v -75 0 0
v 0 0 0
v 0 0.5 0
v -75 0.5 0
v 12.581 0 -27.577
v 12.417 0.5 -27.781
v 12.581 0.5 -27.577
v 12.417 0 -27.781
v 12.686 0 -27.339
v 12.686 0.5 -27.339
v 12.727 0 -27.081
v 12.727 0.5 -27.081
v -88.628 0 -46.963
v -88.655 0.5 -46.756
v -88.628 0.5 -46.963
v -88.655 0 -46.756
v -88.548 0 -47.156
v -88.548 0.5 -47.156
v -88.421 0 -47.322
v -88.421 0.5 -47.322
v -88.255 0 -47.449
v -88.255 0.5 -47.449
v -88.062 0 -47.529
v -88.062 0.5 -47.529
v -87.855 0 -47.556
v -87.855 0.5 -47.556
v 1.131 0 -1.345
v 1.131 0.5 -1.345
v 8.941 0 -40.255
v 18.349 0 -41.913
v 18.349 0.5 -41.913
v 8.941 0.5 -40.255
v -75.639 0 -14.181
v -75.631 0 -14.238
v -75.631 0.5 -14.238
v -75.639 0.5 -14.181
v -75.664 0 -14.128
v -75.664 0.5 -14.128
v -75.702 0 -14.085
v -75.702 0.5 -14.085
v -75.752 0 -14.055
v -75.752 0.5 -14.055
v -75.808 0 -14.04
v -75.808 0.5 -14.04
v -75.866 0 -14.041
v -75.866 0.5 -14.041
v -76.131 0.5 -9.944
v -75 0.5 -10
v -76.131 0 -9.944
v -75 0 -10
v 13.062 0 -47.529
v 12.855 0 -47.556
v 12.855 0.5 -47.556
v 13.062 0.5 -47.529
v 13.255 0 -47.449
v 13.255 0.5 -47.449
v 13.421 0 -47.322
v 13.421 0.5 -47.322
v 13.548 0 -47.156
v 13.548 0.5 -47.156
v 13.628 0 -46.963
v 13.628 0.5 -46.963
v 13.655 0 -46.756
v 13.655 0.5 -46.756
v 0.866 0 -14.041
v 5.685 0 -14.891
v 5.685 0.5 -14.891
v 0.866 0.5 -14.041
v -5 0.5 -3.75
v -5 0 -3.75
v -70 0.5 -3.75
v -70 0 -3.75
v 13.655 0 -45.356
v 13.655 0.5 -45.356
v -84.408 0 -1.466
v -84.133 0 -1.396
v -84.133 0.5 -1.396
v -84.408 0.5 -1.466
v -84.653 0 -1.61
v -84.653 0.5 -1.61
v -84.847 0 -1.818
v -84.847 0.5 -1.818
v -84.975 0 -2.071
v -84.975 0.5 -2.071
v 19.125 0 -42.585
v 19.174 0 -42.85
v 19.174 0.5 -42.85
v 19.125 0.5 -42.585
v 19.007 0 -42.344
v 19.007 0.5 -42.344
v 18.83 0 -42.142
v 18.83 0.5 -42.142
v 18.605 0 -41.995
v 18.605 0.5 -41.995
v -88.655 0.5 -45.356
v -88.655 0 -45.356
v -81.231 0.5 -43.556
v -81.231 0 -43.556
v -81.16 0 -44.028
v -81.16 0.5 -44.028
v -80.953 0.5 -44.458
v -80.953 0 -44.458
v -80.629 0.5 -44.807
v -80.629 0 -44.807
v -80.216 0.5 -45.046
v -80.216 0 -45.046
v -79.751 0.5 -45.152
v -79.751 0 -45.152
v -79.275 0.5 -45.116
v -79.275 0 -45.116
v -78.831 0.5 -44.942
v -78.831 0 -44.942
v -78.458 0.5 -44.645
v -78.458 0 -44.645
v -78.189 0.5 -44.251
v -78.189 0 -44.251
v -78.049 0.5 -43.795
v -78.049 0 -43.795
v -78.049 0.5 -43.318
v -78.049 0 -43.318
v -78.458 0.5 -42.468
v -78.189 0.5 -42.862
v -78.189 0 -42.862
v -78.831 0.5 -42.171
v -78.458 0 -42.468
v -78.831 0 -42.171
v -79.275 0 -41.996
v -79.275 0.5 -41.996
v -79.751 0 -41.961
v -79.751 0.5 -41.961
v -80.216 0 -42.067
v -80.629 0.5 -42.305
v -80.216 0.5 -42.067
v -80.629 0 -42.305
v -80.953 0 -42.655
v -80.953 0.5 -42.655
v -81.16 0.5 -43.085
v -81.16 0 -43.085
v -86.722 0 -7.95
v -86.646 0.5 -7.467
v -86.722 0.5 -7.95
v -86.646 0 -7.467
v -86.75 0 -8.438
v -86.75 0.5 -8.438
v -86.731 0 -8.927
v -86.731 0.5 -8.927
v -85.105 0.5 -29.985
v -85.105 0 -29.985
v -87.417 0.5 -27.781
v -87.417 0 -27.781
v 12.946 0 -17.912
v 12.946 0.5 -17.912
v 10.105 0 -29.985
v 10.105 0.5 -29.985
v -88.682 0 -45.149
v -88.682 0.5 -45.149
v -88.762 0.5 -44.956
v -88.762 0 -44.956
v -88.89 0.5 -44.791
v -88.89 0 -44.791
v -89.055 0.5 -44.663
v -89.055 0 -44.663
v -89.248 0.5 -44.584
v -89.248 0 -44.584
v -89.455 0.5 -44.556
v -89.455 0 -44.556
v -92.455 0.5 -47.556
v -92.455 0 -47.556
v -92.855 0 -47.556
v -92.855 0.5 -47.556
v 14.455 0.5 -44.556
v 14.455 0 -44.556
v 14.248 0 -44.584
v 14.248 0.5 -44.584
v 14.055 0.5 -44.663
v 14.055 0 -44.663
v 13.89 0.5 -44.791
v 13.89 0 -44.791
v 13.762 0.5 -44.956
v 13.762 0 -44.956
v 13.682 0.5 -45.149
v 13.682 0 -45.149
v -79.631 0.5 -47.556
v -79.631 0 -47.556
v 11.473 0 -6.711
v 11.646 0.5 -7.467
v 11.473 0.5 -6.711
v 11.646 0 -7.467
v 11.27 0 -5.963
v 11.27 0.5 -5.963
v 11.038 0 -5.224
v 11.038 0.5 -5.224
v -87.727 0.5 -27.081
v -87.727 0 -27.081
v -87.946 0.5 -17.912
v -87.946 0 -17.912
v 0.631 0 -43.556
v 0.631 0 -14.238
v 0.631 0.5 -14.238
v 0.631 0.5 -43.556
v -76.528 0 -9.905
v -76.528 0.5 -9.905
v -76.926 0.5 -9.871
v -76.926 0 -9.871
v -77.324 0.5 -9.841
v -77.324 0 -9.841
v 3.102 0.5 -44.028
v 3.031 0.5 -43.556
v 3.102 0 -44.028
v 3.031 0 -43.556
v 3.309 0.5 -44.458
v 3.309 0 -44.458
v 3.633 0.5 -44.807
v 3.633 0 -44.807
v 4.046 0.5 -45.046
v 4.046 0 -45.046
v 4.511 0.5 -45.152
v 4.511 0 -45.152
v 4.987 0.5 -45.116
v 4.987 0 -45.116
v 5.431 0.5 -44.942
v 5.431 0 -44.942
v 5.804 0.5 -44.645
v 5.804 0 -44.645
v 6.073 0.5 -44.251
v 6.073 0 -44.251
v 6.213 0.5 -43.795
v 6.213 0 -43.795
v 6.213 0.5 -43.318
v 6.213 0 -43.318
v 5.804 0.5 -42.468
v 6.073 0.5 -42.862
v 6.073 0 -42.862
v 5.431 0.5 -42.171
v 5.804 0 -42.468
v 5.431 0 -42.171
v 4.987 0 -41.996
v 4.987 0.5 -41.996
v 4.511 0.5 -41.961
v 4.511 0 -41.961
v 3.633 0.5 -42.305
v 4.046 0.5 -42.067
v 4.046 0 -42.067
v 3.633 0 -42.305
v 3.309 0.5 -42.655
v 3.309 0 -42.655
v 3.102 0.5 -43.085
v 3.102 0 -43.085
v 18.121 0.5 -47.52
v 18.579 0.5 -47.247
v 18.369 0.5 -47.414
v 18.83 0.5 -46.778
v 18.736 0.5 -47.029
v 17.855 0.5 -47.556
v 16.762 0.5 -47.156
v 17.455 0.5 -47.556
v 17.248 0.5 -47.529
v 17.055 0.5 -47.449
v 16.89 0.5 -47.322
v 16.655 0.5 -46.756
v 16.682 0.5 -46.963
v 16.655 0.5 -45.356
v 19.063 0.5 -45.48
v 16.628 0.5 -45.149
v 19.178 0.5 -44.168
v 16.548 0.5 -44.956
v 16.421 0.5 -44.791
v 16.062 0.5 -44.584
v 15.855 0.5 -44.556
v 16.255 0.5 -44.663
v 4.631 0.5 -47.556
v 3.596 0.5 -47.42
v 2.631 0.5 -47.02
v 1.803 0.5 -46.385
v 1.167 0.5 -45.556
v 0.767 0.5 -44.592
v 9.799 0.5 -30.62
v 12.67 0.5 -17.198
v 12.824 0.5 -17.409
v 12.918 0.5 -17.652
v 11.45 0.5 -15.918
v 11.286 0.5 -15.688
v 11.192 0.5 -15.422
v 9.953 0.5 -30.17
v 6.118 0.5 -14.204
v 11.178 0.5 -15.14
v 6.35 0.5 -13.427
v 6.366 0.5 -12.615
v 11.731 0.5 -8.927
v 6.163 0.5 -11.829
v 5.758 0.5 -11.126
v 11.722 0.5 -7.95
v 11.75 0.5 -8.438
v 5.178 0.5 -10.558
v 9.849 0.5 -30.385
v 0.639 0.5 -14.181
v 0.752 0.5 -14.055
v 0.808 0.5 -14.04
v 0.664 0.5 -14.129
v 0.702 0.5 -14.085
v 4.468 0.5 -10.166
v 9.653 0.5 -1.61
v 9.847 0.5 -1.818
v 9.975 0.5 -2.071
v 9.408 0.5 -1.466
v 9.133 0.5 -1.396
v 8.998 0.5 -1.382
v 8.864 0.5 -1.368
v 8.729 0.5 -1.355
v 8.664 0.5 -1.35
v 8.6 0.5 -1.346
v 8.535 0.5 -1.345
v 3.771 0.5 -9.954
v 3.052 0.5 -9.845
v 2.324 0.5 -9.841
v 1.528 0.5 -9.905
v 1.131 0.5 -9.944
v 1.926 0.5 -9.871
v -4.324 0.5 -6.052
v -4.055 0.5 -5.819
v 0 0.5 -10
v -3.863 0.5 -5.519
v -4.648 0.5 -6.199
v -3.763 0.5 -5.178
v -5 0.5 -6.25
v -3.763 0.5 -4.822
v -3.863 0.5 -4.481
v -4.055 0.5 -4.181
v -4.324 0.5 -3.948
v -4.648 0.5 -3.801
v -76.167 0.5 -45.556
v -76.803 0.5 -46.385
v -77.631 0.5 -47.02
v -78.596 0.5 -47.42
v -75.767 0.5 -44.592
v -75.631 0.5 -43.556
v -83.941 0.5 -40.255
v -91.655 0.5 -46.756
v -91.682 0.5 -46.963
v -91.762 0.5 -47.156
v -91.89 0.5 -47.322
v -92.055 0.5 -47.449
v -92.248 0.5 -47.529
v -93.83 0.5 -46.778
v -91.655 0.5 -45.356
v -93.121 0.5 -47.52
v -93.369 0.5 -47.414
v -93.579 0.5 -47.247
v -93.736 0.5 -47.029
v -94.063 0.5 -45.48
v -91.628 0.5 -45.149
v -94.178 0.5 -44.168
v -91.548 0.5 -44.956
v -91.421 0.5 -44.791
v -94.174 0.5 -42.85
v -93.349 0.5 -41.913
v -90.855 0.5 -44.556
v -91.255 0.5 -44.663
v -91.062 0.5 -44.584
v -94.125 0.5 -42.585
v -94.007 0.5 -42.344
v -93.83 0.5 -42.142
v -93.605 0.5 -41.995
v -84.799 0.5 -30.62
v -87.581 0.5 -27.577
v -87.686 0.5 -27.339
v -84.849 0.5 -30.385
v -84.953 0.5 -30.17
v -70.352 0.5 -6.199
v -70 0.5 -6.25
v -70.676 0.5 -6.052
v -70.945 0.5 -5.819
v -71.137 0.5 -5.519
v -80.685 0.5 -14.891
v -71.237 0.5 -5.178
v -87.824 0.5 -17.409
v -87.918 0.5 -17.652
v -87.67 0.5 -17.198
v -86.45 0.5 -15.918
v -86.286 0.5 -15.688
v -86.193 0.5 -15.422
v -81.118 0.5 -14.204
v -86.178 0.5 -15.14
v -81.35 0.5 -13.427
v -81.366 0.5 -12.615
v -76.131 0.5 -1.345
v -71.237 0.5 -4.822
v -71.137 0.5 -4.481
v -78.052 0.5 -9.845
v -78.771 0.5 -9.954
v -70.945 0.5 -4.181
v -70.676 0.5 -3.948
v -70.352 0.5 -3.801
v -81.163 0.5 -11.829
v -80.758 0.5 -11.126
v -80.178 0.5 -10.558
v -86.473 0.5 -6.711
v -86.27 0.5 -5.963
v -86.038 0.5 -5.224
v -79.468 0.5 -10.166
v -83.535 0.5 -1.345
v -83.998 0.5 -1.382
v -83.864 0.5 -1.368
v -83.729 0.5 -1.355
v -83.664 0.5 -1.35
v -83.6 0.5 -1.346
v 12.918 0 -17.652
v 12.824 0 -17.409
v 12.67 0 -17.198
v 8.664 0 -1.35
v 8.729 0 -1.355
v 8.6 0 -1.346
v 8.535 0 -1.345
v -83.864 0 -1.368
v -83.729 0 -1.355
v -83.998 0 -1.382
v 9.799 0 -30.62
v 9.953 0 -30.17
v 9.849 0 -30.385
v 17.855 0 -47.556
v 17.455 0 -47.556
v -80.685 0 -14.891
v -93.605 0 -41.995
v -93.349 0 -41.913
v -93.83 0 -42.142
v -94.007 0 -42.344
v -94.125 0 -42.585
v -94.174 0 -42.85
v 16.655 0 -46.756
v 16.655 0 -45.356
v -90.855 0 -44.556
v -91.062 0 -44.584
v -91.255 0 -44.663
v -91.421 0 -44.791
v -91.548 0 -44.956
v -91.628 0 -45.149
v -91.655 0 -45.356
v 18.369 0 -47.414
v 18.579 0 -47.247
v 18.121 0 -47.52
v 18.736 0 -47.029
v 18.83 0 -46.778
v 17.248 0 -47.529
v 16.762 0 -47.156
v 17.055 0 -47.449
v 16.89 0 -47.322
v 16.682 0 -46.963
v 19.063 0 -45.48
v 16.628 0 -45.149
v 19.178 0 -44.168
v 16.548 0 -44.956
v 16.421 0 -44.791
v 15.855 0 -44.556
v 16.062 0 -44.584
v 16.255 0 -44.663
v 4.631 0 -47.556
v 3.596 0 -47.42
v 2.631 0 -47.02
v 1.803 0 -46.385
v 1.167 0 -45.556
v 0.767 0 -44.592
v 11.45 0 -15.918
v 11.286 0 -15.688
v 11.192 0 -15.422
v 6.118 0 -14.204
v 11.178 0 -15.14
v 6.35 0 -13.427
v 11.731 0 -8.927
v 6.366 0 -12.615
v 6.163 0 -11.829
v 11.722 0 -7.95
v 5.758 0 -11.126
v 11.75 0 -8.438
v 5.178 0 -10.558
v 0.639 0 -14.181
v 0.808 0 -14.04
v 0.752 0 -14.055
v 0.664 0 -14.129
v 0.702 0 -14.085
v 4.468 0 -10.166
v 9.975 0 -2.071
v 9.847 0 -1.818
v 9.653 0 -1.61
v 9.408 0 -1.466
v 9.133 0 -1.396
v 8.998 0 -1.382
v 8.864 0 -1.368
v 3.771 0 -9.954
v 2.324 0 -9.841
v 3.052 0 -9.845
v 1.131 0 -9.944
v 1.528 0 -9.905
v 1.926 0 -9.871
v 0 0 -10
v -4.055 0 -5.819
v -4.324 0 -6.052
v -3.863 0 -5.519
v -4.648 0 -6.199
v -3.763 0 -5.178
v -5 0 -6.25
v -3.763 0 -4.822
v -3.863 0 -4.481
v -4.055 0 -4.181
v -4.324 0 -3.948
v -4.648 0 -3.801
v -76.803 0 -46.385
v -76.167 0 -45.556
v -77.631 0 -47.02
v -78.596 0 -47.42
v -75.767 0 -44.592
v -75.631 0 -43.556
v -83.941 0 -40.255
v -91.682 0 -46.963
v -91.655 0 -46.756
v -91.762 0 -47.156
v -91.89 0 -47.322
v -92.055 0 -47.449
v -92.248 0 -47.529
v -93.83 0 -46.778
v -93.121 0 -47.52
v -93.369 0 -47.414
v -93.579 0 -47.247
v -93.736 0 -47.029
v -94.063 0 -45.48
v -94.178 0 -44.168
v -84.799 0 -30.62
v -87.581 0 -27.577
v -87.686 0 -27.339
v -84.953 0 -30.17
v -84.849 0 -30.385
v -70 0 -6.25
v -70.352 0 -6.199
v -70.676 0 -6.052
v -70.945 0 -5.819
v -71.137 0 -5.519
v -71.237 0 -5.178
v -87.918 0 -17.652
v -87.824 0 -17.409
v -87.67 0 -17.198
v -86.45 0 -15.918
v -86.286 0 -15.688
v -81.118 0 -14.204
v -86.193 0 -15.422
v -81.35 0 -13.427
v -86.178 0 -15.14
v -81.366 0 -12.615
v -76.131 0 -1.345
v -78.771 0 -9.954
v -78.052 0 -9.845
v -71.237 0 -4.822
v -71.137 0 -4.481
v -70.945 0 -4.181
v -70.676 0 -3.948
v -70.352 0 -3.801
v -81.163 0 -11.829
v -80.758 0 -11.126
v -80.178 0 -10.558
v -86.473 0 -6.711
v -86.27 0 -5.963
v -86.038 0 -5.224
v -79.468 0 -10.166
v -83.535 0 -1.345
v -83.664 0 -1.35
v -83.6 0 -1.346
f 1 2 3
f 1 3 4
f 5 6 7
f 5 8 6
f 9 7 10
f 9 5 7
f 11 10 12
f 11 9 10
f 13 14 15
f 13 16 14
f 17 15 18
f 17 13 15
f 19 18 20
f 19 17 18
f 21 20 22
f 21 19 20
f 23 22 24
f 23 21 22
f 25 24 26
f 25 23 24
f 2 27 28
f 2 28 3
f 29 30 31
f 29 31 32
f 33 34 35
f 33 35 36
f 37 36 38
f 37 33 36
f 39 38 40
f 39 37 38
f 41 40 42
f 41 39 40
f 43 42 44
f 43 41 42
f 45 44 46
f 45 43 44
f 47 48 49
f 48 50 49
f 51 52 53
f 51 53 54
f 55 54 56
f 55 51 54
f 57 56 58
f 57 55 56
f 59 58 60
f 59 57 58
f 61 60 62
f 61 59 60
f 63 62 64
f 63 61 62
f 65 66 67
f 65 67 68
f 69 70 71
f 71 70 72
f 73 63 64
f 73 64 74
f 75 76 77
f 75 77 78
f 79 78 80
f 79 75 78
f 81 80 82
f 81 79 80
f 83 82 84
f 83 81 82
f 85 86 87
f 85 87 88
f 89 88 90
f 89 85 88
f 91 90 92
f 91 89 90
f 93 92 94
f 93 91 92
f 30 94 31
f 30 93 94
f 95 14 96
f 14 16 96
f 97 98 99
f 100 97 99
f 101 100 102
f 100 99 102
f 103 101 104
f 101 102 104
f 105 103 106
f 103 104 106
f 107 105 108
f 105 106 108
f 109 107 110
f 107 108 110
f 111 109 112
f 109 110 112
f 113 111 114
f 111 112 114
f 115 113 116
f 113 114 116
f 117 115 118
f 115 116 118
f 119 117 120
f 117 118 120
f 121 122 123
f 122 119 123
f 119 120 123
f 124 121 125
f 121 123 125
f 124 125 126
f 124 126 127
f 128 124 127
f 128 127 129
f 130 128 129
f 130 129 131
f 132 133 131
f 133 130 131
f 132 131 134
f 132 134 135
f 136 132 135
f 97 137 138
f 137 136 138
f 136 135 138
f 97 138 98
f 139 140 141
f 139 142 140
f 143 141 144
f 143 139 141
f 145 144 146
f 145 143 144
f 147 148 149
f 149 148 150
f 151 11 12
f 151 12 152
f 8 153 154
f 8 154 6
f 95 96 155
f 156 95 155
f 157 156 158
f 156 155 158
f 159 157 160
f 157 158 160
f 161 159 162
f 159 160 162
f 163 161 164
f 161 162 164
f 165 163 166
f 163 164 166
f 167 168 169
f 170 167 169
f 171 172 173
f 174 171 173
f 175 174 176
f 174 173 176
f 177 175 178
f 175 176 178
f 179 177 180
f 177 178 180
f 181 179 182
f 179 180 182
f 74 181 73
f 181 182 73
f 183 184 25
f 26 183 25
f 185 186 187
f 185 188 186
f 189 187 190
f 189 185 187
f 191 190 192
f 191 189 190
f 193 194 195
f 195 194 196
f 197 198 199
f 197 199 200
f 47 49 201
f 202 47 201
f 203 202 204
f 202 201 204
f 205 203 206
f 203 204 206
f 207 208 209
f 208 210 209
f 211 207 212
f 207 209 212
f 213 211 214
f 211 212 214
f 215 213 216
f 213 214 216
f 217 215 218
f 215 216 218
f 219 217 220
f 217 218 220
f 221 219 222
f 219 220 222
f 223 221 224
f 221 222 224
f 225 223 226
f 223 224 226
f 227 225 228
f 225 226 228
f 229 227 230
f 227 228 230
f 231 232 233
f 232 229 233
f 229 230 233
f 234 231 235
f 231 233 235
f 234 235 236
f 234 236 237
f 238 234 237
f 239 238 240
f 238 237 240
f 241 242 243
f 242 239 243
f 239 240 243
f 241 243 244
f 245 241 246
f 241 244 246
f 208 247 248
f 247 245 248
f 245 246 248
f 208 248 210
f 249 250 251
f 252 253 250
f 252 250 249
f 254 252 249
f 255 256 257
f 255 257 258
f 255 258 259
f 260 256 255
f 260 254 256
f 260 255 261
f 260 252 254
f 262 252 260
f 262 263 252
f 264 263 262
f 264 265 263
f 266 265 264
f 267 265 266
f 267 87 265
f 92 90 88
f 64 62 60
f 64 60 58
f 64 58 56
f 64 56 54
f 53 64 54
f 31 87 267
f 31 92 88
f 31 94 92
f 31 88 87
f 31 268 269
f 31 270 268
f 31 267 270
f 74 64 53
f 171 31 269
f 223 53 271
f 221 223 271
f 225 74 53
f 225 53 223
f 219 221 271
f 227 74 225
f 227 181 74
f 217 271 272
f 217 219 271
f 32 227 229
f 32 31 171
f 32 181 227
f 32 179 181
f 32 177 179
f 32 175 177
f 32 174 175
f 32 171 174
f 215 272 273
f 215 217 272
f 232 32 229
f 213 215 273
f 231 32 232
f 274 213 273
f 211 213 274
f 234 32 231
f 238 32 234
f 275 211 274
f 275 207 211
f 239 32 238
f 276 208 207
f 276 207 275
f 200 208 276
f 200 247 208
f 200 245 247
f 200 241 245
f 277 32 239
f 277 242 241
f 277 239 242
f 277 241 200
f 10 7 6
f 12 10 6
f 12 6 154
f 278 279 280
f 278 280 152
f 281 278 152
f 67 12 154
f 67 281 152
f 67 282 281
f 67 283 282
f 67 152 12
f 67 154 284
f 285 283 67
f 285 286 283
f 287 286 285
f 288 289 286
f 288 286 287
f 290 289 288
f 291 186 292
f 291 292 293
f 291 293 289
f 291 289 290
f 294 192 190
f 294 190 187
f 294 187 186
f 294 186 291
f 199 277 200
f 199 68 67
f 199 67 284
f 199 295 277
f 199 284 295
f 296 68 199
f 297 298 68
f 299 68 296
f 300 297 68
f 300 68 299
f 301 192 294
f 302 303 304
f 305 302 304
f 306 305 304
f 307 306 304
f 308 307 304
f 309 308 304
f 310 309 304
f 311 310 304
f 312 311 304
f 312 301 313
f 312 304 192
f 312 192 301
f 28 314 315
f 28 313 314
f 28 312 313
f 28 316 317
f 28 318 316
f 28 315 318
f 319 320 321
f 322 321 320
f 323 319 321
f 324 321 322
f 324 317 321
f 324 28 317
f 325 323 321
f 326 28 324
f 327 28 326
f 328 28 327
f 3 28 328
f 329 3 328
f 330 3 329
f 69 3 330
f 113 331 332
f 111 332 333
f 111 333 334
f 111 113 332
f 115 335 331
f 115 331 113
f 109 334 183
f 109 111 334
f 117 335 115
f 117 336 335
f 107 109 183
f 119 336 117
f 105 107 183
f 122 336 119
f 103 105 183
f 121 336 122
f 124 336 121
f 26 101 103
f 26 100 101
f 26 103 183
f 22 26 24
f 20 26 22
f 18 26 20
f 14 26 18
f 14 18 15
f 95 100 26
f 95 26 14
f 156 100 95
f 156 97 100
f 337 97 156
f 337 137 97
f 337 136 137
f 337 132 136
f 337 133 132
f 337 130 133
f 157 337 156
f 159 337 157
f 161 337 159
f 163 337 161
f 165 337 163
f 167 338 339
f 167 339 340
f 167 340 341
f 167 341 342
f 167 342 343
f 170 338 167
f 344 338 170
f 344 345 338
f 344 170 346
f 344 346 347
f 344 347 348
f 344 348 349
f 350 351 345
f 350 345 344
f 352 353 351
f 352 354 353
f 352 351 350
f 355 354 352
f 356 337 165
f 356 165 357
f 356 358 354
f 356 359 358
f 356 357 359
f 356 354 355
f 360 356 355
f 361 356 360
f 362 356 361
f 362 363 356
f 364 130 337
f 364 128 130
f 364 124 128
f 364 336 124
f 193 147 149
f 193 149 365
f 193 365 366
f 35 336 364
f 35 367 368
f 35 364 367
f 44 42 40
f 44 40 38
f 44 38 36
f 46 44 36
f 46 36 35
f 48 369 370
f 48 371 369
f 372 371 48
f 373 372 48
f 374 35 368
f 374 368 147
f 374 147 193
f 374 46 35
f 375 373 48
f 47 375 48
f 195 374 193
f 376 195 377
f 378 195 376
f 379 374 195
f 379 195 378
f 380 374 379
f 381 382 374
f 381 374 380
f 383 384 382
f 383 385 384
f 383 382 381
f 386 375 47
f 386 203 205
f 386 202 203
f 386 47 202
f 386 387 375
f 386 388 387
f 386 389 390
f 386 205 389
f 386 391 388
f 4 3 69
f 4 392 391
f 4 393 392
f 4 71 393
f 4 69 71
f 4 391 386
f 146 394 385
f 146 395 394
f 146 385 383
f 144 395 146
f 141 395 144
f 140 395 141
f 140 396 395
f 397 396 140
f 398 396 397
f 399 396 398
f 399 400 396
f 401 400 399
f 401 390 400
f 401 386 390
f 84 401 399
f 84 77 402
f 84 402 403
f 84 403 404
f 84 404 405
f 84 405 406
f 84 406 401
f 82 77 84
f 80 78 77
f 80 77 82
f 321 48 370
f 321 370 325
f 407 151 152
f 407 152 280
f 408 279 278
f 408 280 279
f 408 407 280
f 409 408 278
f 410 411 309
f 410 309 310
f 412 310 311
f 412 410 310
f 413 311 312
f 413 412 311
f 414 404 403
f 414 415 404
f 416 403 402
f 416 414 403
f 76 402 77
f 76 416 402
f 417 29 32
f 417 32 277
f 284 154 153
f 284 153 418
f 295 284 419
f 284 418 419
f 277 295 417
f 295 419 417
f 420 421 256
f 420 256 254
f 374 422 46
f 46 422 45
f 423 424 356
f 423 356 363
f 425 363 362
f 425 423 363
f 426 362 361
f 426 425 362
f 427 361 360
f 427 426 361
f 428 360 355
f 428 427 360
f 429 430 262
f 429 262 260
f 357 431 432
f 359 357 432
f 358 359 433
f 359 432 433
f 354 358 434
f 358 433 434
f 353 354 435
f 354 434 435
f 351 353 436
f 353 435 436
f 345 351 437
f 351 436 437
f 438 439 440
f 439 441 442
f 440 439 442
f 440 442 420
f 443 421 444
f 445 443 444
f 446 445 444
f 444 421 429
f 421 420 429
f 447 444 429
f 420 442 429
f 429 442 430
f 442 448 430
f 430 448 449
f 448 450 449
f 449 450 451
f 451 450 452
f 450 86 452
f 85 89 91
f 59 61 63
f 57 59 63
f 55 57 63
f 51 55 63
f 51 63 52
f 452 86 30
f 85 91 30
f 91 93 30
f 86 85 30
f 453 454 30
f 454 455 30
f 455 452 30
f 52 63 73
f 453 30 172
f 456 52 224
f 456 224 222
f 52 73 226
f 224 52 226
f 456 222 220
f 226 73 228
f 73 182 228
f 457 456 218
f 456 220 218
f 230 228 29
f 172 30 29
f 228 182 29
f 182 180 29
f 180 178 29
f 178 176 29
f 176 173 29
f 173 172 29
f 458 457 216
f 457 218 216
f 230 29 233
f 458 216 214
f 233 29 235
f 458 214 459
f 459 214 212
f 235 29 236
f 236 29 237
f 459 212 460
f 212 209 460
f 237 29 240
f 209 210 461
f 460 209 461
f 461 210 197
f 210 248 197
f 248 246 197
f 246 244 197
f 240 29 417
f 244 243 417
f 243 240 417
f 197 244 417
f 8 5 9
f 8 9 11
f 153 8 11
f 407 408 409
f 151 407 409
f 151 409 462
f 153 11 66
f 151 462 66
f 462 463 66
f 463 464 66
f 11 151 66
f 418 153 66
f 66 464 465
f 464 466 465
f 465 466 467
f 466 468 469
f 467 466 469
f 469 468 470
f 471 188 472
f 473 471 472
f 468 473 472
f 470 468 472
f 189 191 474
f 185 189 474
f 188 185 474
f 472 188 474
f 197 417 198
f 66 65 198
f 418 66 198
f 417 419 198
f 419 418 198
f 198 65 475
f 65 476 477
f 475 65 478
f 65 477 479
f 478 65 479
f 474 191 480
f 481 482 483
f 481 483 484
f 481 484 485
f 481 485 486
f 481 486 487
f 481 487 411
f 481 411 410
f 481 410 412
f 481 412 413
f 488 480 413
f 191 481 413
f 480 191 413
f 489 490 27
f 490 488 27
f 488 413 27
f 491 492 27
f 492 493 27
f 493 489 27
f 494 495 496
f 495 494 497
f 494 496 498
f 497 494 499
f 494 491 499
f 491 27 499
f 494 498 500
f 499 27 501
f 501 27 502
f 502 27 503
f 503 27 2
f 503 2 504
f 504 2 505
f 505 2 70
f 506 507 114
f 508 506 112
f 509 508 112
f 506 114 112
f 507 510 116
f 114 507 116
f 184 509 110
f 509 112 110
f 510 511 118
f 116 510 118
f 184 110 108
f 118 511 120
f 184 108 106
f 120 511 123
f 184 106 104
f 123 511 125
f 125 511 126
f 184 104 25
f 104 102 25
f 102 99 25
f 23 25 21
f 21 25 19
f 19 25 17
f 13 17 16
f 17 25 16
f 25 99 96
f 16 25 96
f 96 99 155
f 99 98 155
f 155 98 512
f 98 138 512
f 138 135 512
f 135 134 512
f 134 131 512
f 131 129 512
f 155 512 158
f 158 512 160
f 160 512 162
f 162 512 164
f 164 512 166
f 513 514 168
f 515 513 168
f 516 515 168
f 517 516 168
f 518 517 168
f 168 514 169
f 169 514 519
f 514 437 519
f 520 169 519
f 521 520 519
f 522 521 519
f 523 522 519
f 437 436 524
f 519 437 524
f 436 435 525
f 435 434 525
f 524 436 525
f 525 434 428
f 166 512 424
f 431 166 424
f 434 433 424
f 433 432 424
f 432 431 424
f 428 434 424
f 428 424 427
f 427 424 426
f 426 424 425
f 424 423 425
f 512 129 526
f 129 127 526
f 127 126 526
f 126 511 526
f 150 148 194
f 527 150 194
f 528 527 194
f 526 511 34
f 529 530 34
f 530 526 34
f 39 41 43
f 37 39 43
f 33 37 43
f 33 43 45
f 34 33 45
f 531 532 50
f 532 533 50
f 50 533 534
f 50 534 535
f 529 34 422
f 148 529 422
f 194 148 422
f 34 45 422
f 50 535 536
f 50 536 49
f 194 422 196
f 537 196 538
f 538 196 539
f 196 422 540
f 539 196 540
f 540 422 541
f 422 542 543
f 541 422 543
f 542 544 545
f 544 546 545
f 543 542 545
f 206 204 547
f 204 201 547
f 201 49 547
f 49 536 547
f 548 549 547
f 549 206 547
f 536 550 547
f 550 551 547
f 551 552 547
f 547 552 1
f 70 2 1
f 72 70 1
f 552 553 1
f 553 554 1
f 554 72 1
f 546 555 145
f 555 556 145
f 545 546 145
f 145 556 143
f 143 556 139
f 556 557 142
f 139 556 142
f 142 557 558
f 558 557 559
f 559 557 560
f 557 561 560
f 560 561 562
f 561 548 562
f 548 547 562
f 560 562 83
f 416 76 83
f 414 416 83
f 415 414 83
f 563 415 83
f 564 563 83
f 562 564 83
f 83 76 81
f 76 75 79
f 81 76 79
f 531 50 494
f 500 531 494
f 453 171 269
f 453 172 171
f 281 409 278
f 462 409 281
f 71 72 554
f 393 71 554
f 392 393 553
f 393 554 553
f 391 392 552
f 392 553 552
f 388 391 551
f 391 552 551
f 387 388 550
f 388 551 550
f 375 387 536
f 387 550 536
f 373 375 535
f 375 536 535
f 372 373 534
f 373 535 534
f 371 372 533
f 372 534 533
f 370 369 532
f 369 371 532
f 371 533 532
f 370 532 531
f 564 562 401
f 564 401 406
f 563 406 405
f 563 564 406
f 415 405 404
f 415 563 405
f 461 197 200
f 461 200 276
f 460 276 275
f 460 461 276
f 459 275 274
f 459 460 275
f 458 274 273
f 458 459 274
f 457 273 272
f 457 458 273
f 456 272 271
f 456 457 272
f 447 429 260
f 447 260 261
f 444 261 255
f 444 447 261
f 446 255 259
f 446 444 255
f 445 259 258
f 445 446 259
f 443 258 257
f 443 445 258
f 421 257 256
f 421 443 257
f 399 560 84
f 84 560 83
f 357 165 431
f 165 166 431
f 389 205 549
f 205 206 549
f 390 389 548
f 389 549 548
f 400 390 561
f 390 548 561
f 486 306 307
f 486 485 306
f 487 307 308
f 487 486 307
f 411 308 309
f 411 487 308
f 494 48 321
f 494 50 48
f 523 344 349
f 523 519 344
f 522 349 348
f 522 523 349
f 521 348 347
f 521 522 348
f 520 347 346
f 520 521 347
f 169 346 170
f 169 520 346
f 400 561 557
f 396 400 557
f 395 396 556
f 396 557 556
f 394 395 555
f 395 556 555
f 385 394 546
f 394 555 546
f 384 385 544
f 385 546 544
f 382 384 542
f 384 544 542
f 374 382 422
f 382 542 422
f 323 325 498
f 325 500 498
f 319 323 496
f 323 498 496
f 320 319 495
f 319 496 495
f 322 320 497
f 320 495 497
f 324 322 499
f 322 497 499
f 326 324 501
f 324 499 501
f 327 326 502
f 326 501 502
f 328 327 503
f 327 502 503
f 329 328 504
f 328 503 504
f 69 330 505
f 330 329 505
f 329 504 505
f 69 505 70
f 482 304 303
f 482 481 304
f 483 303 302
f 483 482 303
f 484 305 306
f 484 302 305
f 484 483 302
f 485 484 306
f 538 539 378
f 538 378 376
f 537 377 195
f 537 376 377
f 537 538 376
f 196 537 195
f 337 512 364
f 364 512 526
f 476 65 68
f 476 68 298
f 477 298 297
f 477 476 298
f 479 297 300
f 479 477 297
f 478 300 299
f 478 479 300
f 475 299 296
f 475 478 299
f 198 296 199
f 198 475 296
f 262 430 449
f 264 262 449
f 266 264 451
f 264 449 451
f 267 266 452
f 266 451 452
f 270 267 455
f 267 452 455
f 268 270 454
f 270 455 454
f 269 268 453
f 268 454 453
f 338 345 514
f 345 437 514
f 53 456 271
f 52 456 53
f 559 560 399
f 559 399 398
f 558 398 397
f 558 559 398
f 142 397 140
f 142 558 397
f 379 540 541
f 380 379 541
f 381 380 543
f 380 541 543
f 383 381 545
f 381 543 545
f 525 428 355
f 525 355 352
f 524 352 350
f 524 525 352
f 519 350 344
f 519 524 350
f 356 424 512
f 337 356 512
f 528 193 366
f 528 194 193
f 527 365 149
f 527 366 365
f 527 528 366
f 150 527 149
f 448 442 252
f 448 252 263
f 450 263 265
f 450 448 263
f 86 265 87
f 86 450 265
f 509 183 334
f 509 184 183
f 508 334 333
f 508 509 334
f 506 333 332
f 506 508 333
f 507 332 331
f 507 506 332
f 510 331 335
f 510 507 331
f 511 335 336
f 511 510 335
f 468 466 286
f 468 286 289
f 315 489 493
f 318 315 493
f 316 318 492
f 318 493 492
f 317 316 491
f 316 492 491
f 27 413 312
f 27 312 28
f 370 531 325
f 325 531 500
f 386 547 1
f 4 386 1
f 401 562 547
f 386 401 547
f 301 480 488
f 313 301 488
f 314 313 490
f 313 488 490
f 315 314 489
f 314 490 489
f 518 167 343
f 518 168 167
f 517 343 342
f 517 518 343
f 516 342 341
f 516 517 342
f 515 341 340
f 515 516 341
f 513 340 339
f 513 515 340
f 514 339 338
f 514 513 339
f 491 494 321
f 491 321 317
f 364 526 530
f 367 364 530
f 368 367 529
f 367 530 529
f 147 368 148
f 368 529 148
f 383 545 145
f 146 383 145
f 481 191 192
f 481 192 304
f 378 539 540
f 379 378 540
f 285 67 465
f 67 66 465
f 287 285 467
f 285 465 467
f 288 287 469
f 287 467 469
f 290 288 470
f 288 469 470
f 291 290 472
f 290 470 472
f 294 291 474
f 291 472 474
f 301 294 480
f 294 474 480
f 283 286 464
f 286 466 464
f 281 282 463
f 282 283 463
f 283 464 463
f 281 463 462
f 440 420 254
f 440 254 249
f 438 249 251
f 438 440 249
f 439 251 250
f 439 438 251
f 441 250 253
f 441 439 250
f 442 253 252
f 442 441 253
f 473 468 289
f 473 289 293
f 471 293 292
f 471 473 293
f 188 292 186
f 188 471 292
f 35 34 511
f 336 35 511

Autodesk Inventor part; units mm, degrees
ref_plane "YZ Plane" through (0, 0, 0) normal (1, 0, 0) x (0, 1, 0)
ref_plane "XZ Plane" through (0, 0, 0) normal (0, 1, 0) x (-1, 0, 0)
ref_plane "XY Plane" through (0, 0, 0) normal (0, 0, 1) x (1, 0, 0)
sketch "Эскиз1" plane through (0, 0, 0) normal (0, 1, 0) x (-1, 0, 0)
  circle A0 centre (-4.631, -43.5563) radius 1.6
  arc A1 (5, -3.75) -> (5, -6.25) centre (5, -5) ccw
  line L0 (5, -3.75) -> (70, -3.75)
  arc A2 (70, -6.25) -> (70, -3.75) centre (70, -5) ccw
  line L1 (70, -6.25) -> (5, -6.25)
  arc A3 (77.3239, -9.8413) -> (76.131, -9.9442) centre (79.631, -43.5563) ccw
  arc A4 (79.4677, -10.1658) -> (77.3239, -9.8413) centre (77.6653, -14.8296) ccw
  arc A5 (80.6854, -14.8912) -> (79.4677, -10.1658) centre (78.3862, -12.9641) ccw
  line L2 (80.6854, -14.8912) -> (75.8657, -14.0414)
  arc A6 (75.8657, -14.0414) -> (75.631, -14.2384) centre (75.831, -14.2384) ccw
  line L3 (75.631, -14.2384) -> (75.631, -43.5563)
  arc A7 (75.631, -43.5563) -> (79.631, -47.5563) centre (79.631, -43.5563) ccw
  line L4 (79.631, -47.5563) -> (87.8552, -47.5563)
  arc A8 (87.8552, -47.5563) -> (88.6552, -46.7563) centre (87.8552, -46.7563) ccw
  line L5 (88.6552, -46.7563) -> (88.6552, -45.3563)
  arc A9 (89.4552, -44.5563) -> (88.6552, -45.3563) centre (89.4552, -45.3563) ccw
  line L6 (89.4552, -44.5563) -> (90.8552, -44.5563)
  arc A10 (91.6552, -45.3563) -> (90.8552, -44.5563) centre (90.8552, -45.3563) ccw
  line L7 (91.6552, -45.3563) -> (91.6552, -46.7563)
  arc A11 (91.6552, -46.7563) -> (92.4552, -47.5563) centre (92.4552, -46.7563) ccw
  line L8 (92.4552, -47.5563) -> (92.8552, -47.5563)
  arc A12 (92.8552, -47.5563) -> (93.8304, -46.7775) centre (92.8552, -46.5563) ccw
  arc A13 (93.8304, -46.7775) -> (94.174, -42.8497) centre (79.631, -43.5563) ccw
  arc A14 (94.174, -42.8497) -> (93.3489, -41.9134) centre (93.1752, -42.8982) ccw
  line L9 (93.3489, -41.9134) -> (83.9409, -40.2546)
  line L10 (83.9409, -40.2546) -> (84.7989, -30.6198)
  arc A15 (85.1049, -29.9847) -> (84.7989, -30.6198) centre (85.795, -30.7085) ccw
  line L11 (85.1049, -29.9847) -> (87.4169, -27.7806)
  arc A16 (87.4169, -27.7806) -> (87.7266, -27.0807) centre (86.7269, -27.0568) ccw
  line L12 (87.7266, -27.0807) -> (87.9456, -17.9117)
  arc A17 (87.9456, -17.9117) -> (87.6697, -17.1978) centre (86.9459, -17.8878) ccw
  line L13 (87.6697, -17.1978) -> (86.4498, -15.9183)
  arc A18 (86.1776, -15.1396) -> (86.4498, -15.9183) centre (87.1736, -15.2283) ccw
  line L14 (86.1776, -15.1396) -> (86.7309, -8.9267)
  arc A19 (86.7309, -8.9267) -> (86.6462, -7.4668) centre (81.7506, -8.4832) ccw
  arc A20 (86.6462, -7.4668) -> (86.0376, -5.2239) centre (67.7491, -11.39) ccw
  line L15 (86.0376, -5.2239) -> (84.9746, -2.0709)
  arc A21 (84.9746, -2.0709) -> (84.1332, -1.396) centre (84.027, -2.3904) ccw
  arc A22 (84.1332, -1.396) -> (83.7286, -1.3548) centre (79.631, -43.5563) ccw
  arc A23 (83.7286, -1.3548) -> (83.5353, -1.3454) centre (83.5353, -3.3454) ccw
  line L16 (83.5353, -1.3454) -> (76.131, -1.3454)
  line L17 (76.131, -1.3454) -> (75, 0)
  line L18 (0, 0) -> (75, 0)
  line L19 (-1.131, -1.3454) -> (0, 0)
  line L20 (-8.5353, -1.3454) -> (-1.131, -1.3454)
  arc A24 (-8.5353, -1.3454) -> (-8.7286, -1.3548) centre (-8.5353, -3.3454) ccw
  arc A25 (-8.7286, -1.3548) -> (-9.1332, -1.396) centre (-4.631, -43.5563) ccw
  arc A26 (-9.1332, -1.396) -> (-9.9746, -2.0709) centre (-9.027, -2.3904) ccw
  line L21 (-11.0376, -5.2239) -> (-9.9746, -2.0709)
  arc A27 (-11.0376, -5.2239) -> (-11.6462, -7.4668) centre (7.2509, -11.39) ccw
  arc A28 (-11.6462, -7.4668) -> (-11.7309, -8.9267) centre (-6.7506, -8.4832) ccw
  line L22 (-11.1776, -15.1396) -> (-11.7309, -8.9267)
  arc A29 (-11.4498, -15.9183) -> (-11.1776, -15.1396) centre (-12.1736, -15.2283) ccw
  line L23 (-12.6697, -17.1978) -> (-11.4498, -15.9183)
  arc A30 (-12.6697, -17.1978) -> (-12.9456, -17.9117) centre (-11.9459, -17.8878) ccw
  line L24 (-12.7266, -27.0807) -> (-12.9456, -17.9117)
  arc A31 (-12.7266, -27.0807) -> (-12.4169, -27.7806) centre (-11.7269, -27.0568) ccw
  line L25 (-10.1049, -29.9847) -> (-12.4169, -27.7806)
  arc A32 (-9.7989, -30.6198) -> (-10.1049, -29.9847) centre (-10.795, -30.7085) ccw
  line L26 (-8.9409, -40.2546) -> (-9.7989, -30.6198)
  line L27 (-18.3489, -41.9134) -> (-8.9409, -40.2546)
  arc A33 (-18.3489, -41.9134) -> (-19.174, -42.8497) centre (-18.1752, -42.8982) ccw
  arc A34 (-19.174, -42.8497) -> (-18.8304, -46.7775) centre (-4.631, -43.5563) ccw
  arc A35 (-18.8304, -46.7775) -> (-17.8552, -47.5563) centre (-17.8552, -46.5563) ccw
  line L28 (-17.4552, -47.5563) -> (-17.8552, -47.5563)
  arc A36 (-17.4552, -47.5563) -> (-16.6552, -46.7563) centre (-17.4552, -46.7563) ccw
  line L29 (-16.6552, -45.3563) -> (-16.6552, -46.7563)
  arc A37 (-15.8552, -44.5563) -> (-16.6552, -45.3563) centre (-15.8552, -45.3563) ccw
  line L30 (-14.4552, -44.5563) -> (-15.8552, -44.5563)
  arc A38 (-13.6552, -45.3563) -> (-14.4552, -44.5563) centre (-14.4552, -45.3563) ccw
  line L31 (-13.6552, -46.7563) -> (-13.6552, -45.3563)
  arc A39 (-13.6552, -46.7563) -> (-12.8552, -47.5563) centre (-12.8552, -46.7563) ccw
  line L32 (-4.631, -47.5563) -> (-12.8552, -47.5563)
  arc A40 (-4.631, -47.5563) -> (-0.631, -43.5563) centre (-4.631, -43.5563) ccw
  line L33 (-0.631, -14.2384) -> (-0.631, -43.5563)
  arc A41 (-0.631, -14.2384) -> (-0.8657, -14.0414) centre (-0.831, -14.2384) ccw
  line L34 (-5.6854, -14.8912) -> (-0.8657, -14.0414)
  arc A42 (-4.4677, -10.1658) -> (-5.6854, -14.8912) centre (-3.3862, -12.9641) ccw
  arc A43 (-2.3239, -9.8413) -> (-4.4677, -10.1658) centre (-2.6653, -14.8296) ccw
  arc A44 (-1.131, -9.9442) -> (-2.3239, -9.8413) centre (-4.631, -43.5563) ccw
  line L35 (0, -10) -> (-1.131, -9.9442)
  line L36 (75, -10) -> (0, -10)
  line L37 (75, -10) -> (76.131, -9.9442)
  circle A45 centre (79.631, -43.5563) radius 1.6
extrude "Выдавливание1" add sketch "Эскиз1" along normal blind 0.5
properties part number "petal_forPrint"
